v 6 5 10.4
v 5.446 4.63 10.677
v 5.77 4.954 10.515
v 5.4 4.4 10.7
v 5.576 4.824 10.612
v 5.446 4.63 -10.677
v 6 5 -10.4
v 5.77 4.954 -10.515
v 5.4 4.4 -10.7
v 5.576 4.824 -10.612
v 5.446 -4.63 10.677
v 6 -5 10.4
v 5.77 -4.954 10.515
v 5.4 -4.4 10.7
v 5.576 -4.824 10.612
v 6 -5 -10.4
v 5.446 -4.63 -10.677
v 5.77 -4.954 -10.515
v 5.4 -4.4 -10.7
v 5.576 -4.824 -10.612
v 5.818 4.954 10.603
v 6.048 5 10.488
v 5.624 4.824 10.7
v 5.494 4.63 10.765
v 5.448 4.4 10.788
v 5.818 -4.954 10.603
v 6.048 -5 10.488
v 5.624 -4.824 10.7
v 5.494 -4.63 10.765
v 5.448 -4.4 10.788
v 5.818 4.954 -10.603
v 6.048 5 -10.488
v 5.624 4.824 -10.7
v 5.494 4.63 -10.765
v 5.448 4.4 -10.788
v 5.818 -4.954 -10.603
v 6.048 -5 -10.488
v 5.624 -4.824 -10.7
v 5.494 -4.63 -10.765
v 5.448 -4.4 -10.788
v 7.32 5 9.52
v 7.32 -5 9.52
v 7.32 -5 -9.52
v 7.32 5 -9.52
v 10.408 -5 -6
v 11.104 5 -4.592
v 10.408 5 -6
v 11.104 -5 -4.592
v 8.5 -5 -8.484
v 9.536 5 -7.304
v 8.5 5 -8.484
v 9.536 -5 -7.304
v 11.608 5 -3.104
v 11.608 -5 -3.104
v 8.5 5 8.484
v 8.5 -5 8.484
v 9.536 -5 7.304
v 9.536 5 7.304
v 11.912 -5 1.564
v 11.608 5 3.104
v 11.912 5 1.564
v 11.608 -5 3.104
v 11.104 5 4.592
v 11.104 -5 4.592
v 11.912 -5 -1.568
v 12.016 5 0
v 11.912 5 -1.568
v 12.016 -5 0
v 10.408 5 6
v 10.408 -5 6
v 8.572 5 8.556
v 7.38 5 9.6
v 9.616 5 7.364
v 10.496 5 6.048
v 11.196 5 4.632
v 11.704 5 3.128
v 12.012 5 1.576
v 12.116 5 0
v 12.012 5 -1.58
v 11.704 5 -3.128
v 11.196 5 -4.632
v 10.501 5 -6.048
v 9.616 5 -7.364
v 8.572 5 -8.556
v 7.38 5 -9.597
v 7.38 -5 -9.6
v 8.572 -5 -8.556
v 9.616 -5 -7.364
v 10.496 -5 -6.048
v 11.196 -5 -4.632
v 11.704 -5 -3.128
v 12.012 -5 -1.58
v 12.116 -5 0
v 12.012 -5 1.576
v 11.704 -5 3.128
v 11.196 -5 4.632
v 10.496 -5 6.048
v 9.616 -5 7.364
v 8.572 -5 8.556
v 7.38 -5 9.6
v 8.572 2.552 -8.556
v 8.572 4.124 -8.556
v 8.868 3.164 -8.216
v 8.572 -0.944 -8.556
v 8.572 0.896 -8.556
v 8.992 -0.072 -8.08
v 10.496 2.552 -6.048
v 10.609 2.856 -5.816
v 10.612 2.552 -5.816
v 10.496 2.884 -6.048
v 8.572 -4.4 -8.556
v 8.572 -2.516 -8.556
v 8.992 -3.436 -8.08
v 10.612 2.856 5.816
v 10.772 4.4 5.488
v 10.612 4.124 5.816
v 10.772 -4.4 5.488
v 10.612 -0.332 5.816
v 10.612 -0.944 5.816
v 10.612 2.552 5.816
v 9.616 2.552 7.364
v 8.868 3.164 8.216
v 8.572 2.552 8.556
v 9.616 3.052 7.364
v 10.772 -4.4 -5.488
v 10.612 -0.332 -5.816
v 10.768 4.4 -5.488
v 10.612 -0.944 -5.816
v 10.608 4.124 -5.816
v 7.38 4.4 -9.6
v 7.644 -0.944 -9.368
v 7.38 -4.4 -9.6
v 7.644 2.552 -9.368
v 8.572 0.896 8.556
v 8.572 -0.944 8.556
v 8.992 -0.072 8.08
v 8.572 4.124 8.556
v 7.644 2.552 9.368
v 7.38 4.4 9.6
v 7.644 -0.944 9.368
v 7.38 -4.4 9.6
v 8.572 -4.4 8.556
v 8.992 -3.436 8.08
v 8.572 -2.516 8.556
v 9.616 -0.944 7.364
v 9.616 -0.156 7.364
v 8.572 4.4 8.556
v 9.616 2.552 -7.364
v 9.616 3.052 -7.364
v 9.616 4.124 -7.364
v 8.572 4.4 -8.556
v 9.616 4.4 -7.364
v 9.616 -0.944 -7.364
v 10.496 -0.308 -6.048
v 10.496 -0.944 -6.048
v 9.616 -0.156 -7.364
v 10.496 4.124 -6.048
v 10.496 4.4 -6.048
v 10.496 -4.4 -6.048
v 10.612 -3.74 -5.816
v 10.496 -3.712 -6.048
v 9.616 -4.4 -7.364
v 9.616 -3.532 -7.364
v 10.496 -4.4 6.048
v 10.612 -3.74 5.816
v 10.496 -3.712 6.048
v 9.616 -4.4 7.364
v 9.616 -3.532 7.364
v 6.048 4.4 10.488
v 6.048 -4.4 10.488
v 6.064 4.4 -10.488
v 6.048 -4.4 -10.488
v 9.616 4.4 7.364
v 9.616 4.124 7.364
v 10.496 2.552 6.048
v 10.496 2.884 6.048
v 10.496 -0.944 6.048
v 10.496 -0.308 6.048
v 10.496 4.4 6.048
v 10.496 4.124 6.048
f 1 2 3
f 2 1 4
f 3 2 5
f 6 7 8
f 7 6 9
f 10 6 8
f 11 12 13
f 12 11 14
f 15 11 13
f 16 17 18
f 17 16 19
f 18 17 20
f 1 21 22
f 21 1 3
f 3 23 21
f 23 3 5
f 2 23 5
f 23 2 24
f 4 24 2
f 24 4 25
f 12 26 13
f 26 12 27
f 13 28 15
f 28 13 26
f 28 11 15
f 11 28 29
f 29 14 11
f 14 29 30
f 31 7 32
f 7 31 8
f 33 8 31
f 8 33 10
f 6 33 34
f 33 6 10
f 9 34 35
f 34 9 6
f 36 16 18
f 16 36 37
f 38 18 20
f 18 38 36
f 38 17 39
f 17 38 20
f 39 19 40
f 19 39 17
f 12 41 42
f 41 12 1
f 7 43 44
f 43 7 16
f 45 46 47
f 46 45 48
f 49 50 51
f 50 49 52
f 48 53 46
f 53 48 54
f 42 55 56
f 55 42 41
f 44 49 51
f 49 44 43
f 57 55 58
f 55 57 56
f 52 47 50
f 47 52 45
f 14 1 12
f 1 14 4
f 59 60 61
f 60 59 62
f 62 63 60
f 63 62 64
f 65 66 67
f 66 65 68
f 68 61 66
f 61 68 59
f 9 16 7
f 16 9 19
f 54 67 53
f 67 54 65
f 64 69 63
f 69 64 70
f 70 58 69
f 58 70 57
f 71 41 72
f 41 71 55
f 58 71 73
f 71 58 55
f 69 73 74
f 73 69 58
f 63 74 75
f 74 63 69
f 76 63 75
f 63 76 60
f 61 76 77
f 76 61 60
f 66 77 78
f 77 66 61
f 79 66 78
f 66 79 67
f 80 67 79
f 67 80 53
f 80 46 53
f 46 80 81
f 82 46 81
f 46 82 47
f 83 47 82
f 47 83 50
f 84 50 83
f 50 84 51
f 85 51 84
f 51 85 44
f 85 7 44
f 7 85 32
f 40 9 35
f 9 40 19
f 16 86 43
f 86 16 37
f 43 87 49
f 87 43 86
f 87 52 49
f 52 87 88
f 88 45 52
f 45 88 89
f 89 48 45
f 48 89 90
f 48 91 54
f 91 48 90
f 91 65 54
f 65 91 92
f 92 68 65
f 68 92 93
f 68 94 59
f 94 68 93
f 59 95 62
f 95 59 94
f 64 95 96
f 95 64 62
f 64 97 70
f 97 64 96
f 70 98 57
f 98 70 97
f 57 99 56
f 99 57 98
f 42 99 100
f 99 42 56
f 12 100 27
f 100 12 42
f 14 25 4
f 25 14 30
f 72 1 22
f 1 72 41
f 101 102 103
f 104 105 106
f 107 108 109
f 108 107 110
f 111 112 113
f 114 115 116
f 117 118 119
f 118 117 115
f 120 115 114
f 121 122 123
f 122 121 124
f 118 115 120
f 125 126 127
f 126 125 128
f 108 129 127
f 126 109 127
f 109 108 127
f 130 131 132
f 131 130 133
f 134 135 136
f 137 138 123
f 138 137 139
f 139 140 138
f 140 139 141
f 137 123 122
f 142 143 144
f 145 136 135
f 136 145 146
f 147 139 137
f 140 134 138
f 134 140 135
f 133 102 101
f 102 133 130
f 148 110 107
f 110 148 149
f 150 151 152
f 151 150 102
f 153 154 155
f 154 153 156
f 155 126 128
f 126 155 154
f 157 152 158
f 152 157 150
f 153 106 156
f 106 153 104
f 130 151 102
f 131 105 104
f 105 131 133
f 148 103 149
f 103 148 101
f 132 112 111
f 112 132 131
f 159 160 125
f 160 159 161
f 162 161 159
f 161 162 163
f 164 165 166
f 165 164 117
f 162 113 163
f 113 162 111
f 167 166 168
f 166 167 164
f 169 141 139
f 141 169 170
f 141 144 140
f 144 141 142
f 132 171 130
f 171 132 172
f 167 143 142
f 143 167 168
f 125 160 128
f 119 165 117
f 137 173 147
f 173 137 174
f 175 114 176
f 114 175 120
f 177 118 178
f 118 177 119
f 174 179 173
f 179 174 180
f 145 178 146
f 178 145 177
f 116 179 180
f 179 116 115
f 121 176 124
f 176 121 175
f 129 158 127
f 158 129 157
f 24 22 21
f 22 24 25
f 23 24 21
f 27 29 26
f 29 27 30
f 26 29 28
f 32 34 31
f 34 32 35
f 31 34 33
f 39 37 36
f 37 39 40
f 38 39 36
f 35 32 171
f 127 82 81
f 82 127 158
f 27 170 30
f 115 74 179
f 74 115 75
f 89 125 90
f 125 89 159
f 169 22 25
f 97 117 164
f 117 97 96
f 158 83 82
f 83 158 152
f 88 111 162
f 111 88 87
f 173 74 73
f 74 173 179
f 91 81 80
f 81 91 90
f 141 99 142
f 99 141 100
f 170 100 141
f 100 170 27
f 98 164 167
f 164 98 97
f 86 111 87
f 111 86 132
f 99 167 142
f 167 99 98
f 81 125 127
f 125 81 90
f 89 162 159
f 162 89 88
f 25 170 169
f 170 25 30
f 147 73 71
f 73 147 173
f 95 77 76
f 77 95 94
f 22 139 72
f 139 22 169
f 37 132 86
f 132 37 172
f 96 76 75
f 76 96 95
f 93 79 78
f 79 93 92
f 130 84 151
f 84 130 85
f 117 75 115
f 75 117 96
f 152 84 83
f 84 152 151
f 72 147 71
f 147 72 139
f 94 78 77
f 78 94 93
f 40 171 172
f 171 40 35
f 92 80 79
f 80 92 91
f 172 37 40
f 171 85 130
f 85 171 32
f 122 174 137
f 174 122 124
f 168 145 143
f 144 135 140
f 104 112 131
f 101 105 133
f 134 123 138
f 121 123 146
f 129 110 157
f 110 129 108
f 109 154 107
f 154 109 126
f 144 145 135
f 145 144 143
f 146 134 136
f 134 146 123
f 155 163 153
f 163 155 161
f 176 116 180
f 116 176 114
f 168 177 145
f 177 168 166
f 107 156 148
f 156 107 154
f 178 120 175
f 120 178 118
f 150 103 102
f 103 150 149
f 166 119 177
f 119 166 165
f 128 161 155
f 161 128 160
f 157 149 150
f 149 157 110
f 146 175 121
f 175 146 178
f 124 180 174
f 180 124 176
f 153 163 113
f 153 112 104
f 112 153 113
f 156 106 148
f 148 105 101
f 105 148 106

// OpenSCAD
// file: ../p/1-4cyli.scad
use <../lib.scad>
function ldraw_lib__1_4cyli() = [
// 0 Cylinder 0.25
// 0 Name: 1-4cyli.dat
// 0 Author: James Jessiman
// 0 !LDRAW_ORG Primitive UPDATE 2012-01
// 0 !LICENSE Licensed under CC BY 4.0 : see CAreadme.txt
// 
// 0 BFC CERTIFY CCW
  [0,"BFC","CERTIFY"],
  [0,"BFC","CCW"],
// 
// 0 !HISTORY 2002-03-23 [sbliss] Added BFC statement.
// 0 !HISTORY 2002-04-25 [PTadmin] Official Update 2002-02
// 0 !HISTORY 2007-06-22 [PTadmin] Header formatted for Contributor Agreement
// 0 !HISTORY 2008-07-01 [PTadmin] Official Update 2008-01
// 0 !HISTORY 2012-02-16 [Philo] Changed to CCW
// 0 !HISTORY 2012-03-30 [PTadmin] Official Update 2012-01
// 
// 
// 4 16 1 1 0 0.9239 1 0.3827 0.9239 0 0.3827 1 0 0
  [4,16,1,1,0,0.9239,1,0.3827,0.9239,0,0.3827,1,0,0],
// 5 24 1 0 0 1 1 0 0.9239 0 0.3827 1 0 -1
  [5,24,1,0,0,1,1,0,0.9239,0,0.3827,1,0,-1],
// 4 16 0.9239 1 0.3827 0.7071 1 0.7071 0.7071 0 0.7071 0.9239 0 0.3827
  [4,16,0.9239,1,0.3827,0.7071,1,0.7071,0.7071,0,0.7071,0.9239,0,0.3827],
// 5 24 0.9239 0 0.3827 0.9239 1 0.3827 0.7071 0 0.7071 1 0 0
  [5,24,0.9239,0,0.3827,0.9239,1,0.3827,0.7071,0,0.7071,1,0,0],
// 4 16 0.7071 1 0.7071 0.3827 1 0.9239 0.3827 0 0.9239 0.7071 0 0.7071
  [4,16,0.7071,1,0.7071,0.3827,1,0.9239,0.3827,0,0.9239,0.7071,0,0.7071],
// 5 24 0.7071 0 0.7071 0.7071 1 0.7071 0.3827 0 0.9239 0.9239 0 0.3827
  [5,24,0.7071,0,0.7071,0.7071,1,0.7071,0.3827,0,0.9239,0.9239,0,0.3827],
// 4 16 0.3827 1 0.9239 0 1 1 0 0 1 0.3827 0 0.9239
  [4,16,0.3827,1,0.9239,0,1,1,0,0,1,0.3827,0,0.9239],
// 5 24 0.3827 0 0.9239 0.3827 1 0.9239 0 0 1 0.7071 0 0.7071
  [5,24,0.3827,0,0.9239,0.3827,1,0.9239,0,0,1,0.7071,0,0.7071],
// 5 24 0 0 1 0 1 1 0.3827 0 0.9239 -1 0 1
  [5,24,0,0,1,0,1,1,0.3827,0,0.9239,-1,0,1],
];
module ldraw_lib__1_4cyli(step=0, col=false, unit=2/5, alt=false, line=0.2, solid=!$preview)
    makepoly(ldraw_lib__1_4cyli(), step=step, col=col, unit=unit, alt=alt, line=line, solid=solid);
ldraw_lib__1_4cyli(line=0.2);
// file: ../p/1-4chrd.scad
use <../lib.scad>
function ldraw_lib__1_4chrd() = [
// 0 Chord 0.25
// 0 Name: 1-4chrd.dat
// 0 Author: Max Martin Richter [MMR1988]
// 0 !LDRAW_ORG Primitive UPDATE 2023-05
// 0 !LICENSE Licensed under CC BY 4.0 : see CAreadme.txt
// 
// 0 BFC CERTIFY CCW
  [0,"BFC","CERTIFY"],
  [0,"BFC","CCW"],
// 
// 0 !HISTORY 2004-04-22 [PTadmin] Official Update 2004-02
// 0 !HISTORY 2007-10-09 [PTadmin] Header formatted for Contributor Agreement
// 0 !HISTORY 2008-07-01 [PTadmin] Official Update 2008-01
// 0 !HISTORY 2012-08-02 [MMR1988] Re-creation with PrimGen2 and Rectifier
// 0 !HISTORY 2012-08-09 [PTadmin] Official Update 2012-02
// 0 !HISTORY 2023-10-27 [OrionP] Change author to MMR1988 from hafhead
// 0 !HISTORY 2023-10-31 [OrionP] Official Update 2023-05
// 
// 4 16 0.9239 0 0.3827 0.3827 0 0.9239 0 0 1 1 0 0
  [4,16,0.9239,0,0.3827,0.3827,0,0.9239,0,0,1,1,0,0],
// 3 16 0.7071 0 0.7071 0.3827 0 0.9239 0.9239 0 0.3827
  [3,16,0.7071,0,0.7071,0.3827,0,0.9239,0.9239,0,0.3827],
];
module ldraw_lib__1_4chrd(step=0, col=false, unit=2/5, alt=false, line=0.2, solid=!$preview)
    makepoly(ldraw_lib__1_4chrd(), step=step, col=col, unit=unit, alt=alt, line=line, solid=solid);
ldraw_lib__1_4chrd(line=0.2);
// main file
use <../lib.scad>
use <../p/1-4chrd.scad>
use <s/93168b01.scad>
function ldraw_lib__4622098ac01() = [
// 0 Sticker  3.3 x  1.3 with Square Connections with Vents on Blue Background (Formed)
// 0 Name: 4622098ac01.dat
// 0 Author: Alex Herrera [alanbrito98]
// 0 !LDRAW_ORG Part UPDATE 2026-05
// 0 !LICENSE Licensed under CC BY 4.0 : see CAreadme.txt
// 
// 0 !HELP Origin adapted to Part 93168.dat
// 0 !HELP 1 16 0 0 0 1 0 0 0 1 0 0 0 1 93168.dat
// 0 !HELP 1 1 0 0 -40 1 0 0 0 1 0 0 0 1 4622098ac01.dat
// 0 !HELP 1 1 0 0 -40 -1 0 0 0 -1 0 0 0 1 4622098ac01.dat
// 
// 0 BFC CERTIFY CCW
  [0,"BFC","CERTIFY"],
  [0,"BFC","CCW"],
// 
// 0 !KEYWORDS Bricklink 7962stk01, Brickowl 968771, Episode I, pod racer
// 0 !KEYWORDS Rebrickable 95687, Set 7962, Star Wars, The Phantom Menace
// 
// 0 !HISTORY 2025-05-10 [MagFors] used cyli, corrected condlines
// 0 !HISTORY 2025-11-08 [MagFors] adapted corners to standard
// 0 !HISTORY 2026-05-31 [OrionP] Official Update 2026-05
// 
// 1 16 0 0 0 1 0 0 0 1 0 0 0 1 s\93168b01.dat
  [1,16,0,0,0,1,0,0,0,1,0,0,0,1, ldraw_lib__s__93168b01()],
// 0 // Pattern
// 3 0 21.43 21.39 6.38 21.43 21.39 10.31 22.17 20.54 7.91
  [3,0,21.43,21.39,6.38,21.43,21.39,10.31,22.17,20.54,7.91],
// 3 0 21.43 21.39 -2.36 21.43 21.39 2.24 22.48 20.2 -.18
  [3,0,21.43,21.39,-2.36,21.43,21.39,2.24,22.48,20.2,-.18],
// 4 0 26.24 15.12 7.21 26.522 14.54 7.14 26.53 14.54 6.38 26.24 15.12 6.38
  [4,0,26.24,15.12,7.21,26.522,14.54,7.14,26.53,14.54,6.38,26.24,15.12,6.38],
// 3 0 21.43 21.39 -11 21.43 21.39 -6.29 22.48 20.2 -8.59
  [3,0,21.43,21.39,-11,21.43,21.39,-6.29,22.48,20.2,-8.59],
// 3 0 26.53 -14.54 7.14 26.93 -13.72 11 26.53 -14.54 10.31
  [3,0,26.53,-14.54,7.14,26.93,-13.72,11,26.53,-14.54,10.31],
// 4 0 26.93 -13.72 -11 26.93 -13.72 11 26.53 -14.54 -.83 26.53 -14.54 -2.36
  [4,0,26.93,-13.72,-11,26.93,-13.72,11,26.53,-14.54,-.83,26.53,-14.54,-2.36],
// 3 0 26.53 -14.54 6.38 26.93 -13.72 11 26.53 -14.54 7.14
  [3,0,26.53,-14.54,6.38,26.93,-13.72,11,26.53,-14.54,7.14],
// 4 0 22.17 -20.54 7.91 21.43 -21.39 6.38 24.04 -18.41 6.38 24.04 -18.41 7.63
  [4,0,22.17,-20.54,7.91,21.43,-21.39,6.38,24.04,-18.41,6.38,24.04,-18.41,7.63],
// 3 0 26.53 -14.54 -.83 26.93 -13.72 11 26.53 -14.54 6.38
  [3,0,26.53,-14.54,-.83,26.93,-13.72,11,26.53,-14.54,6.38],
// 4 0 26.93 13.72 -11 26.53 14.54 -2.36 26.53 14.54 -.83 26.92 13.72 11
  [4,0,26.93,13.72,-11,26.53,14.54,-2.36,26.53,14.54,-.83,26.92,13.72,11],
// 3 0 26.522 14.54 7.14 26.52 14.54 10.31 26.92 13.72 11
  [3,0,26.522,14.54,7.14,26.52,14.54,10.31,26.92,13.72,11],
// 3 0 26.53 14.54 -.83 26.53 14.54 6.38 26.92 13.72 11
  [3,0,26.53,14.54,-.83,26.53,14.54,6.38,26.92,13.72,11],
// 3 0 26.53 14.54 6.38 26.522 14.54 7.14 26.92 13.72 11
  [3,0,26.53,14.54,6.38,26.522,14.54,7.14,26.92,13.72,11],
// 4 0 19.11 23.42 6.38 19.11 23.42 -2.36 18.45 24 -11 18.45 24 11
  [4,0,19.11,23.42,6.38,19.11,23.42,-2.36,18.45,24,-11,18.45,24,11],
// 3 0 21.43 -21.39 2.24 21.43 -21.39 -2.36 22.48 -20.2 -.18
  [3,0,21.43,-21.39,2.24,21.43,-21.39,-2.36,22.48,-20.2,-.18],
// 4 0 18.45 -24 11 19.11 -23.42 6.38 21.43 -21.39 6.38 21.43 -21.39 10.31
  [4,0,18.45,-24,11,19.11,-23.42,6.38,21.43,-21.39,6.38,21.43,-21.39,10.31],
// 4 0 19.11 -23.42 6.38 18.45 -24 11 18.45 -24 -11 19.11 -23.42 -2.36
  [4,0,19.11,-23.42,6.38,18.45,-24,11,18.45,-24,-11,19.11,-23.42,-2.36],
// 3 0 21.43 -21.39 10.31 21.43 -21.39 6.38 22.17 -20.54 7.91
  [3,0,21.43,-21.39,10.31,21.43,-21.39,6.38,22.17,-20.54,7.91],
// 3 0 21.43 -21.39 -11 22.48 -20.2 -8.59 21.43 -21.39 -6.29
  [3,0,21.43,-21.39,-11,22.48,-20.2,-8.59,21.43,-21.39,-6.29],
// 4 0 22.48 -20.2 -.18 21.43 -21.39 -2.36 24.04 -18.41 -2.36 24.04 -18.41 -.39
  [4,0,22.48,-20.2,-.18,21.43,-21.39,-2.36,24.04,-18.41,-2.36,24.04,-18.41,-.39],
// 3 0 21.43 -21.39 11 18.45 -24 11 21.43 -21.39 10.31
  [3,0,21.43,-21.39,11,18.45,-24,11,21.43,-21.39,10.31],
// 4 0 21.43 -21.39 -2.36 21.43 -21.39 2.24 19.11 -23.42 6.38 19.11 -23.42 -2.36
  [4,0,21.43,-21.39,-2.36,21.43,-21.39,2.24,19.11,-23.42,6.38,19.11,-23.42,-2.36],
// 4 0 21.43 21.39 6.38 19.11 23.42 6.38 18.45 24 11 21.43 21.39 10.31
  [4,0,21.43,21.39,6.38,19.11,23.42,6.38,18.45,24,11,21.43,21.39,10.31],
// 4 0 26.24 15.12 7.21 26.24 15.12 6.38 24.04 18.41 6.38 24.04 18.41 7.63
  [4,0,26.24,15.12,7.21,26.24,15.12,6.38,24.04,18.41,6.38,24.04,18.41,7.63],
// 4 0 24.04 18.41 11 24.04 18.41 10.31 21.43 21.39 10.31 21.43 21.39 11
  [4,0,24.04,18.41,11,24.04,18.41,10.31,21.43,21.39,10.31,21.43,21.39,11],
// 4 0 26.24 15.12 -.77 26.24 15.12 -2.36 24.04 18.41 -2.36 24.04 18.41 -.39
  [4,0,26.24,15.12,-.77,26.24,15.12,-2.36,24.04,18.41,-2.36,24.04,18.41,-.39],
// 4 0 26.24 15.12 -.77 26.53 14.54 -.83 26.53 14.54 -2.36 26.24 15.12 -2.36
  [4,0,26.24,15.12,-.77,26.53,14.54,-.83,26.53,14.54,-2.36,26.24,15.12,-2.36],
// 4 0 26.24 15.12 11 26.24 15.12 10.31 24.04 18.41 10.31 24.04 18.41 11
  [4,0,26.24,15.12,11,26.24,15.12,10.31,24.04,18.41,10.31,24.04,18.41,11],
// 4 0 21.43 21.39 -2.36 22.48 20.2 -.18 24.04 18.41 -.39 24.04 18.41 -2.36
  [4,0,21.43,21.39,-2.36,22.48,20.2,-.18,24.04,18.41,-.39,24.04,18.41,-2.36],
// 3 0 18.45 24 11 21.43 21.39 11 21.43 21.39 10.31
  [3,0,18.45,24,11,21.43,21.39,11,21.43,21.39,10.31],
// 4 0 19.11 23.42 6.38 21.43 21.39 2.24 21.43 21.39 -2.36 19.11 23.42 -2.36
  [4,0,19.11,23.42,6.38,21.43,21.39,2.24,21.43,21.39,-2.36,19.11,23.42,-2.36],
// 4 0 21.43 21.39 6.38 22.17 20.54 7.91 24.04 18.41 7.63 24.04 18.41 6.38
  [4,0,21.43,21.39,6.38,22.17,20.54,7.91,24.04,18.41,7.63,24.04,18.41,6.38],
// 4 0 18.45 24 -11 19.11 23.42 -2.36 21.43 21.39 -6.29 21.43 21.39 -11
  [4,0,18.45,24,-11,19.11,23.42,-2.36,21.43,21.39,-6.29,21.43,21.39,-11],
// 4 0 26.24 15.12 -9.28 26.53 14.54 -9.35 26.93 13.72 -11 26.24 15.12 -11
  [4,0,26.24,15.12,-9.28,26.53,14.54,-9.35,26.93,13.72,-11,26.24,15.12,-11],
// 4 0 24.04 18.41 -11 24.04 18.41 -8.83 26.24 15.12 -9.28 26.24 15.12 -11
  [4,0,24.04,18.41,-11,24.04,18.41,-8.83,26.24,15.12,-9.28,26.24,15.12,-11],
// 4 0 26.24 -15.12 -11 26.93 -13.72 -11 26.53 -14.54 -9.35 26.24 -15.12 -9.28
  [4,0,26.24,-15.12,-11,26.93,-13.72,-11,26.53,-14.54,-9.35,26.24,-15.12,-9.28],
// 4 0 21.43 21.39 -11 22.48 20.2 -8.59 24.04 18.41 -8.83 24.04 18.41 -11
  [4,0,21.43,21.39,-11,22.48,20.2,-8.59,24.04,18.41,-8.83,24.04,18.41,-11],
// 4 0 26.24 -15.12 -11 26.24 -15.12 -9.28 24.04 -18.41 -8.83 24.04 -18.41 -11
  [4,0,26.24,-15.12,-11,26.24,-15.12,-9.28,24.04,-18.41,-8.83,24.04,-18.41,-11],
// 4 0 18.45 -24 -11 18.45 -24 11 15.12 -26.22 11 15.12 -26.22 -11
  [4,0,18.45,-24,-11,18.45,-24,11,15.12,-26.22,11,15.12,-26.22,-11],
// 4 0 21.43 -21.39 -11 21.43 -21.39 -6.29 19.11 -23.42 -2.36 18.45 -24 -11
  [4,0,21.43,-21.39,-11,21.43,-21.39,-6.29,19.11,-23.42,-2.36,18.45,-24,-11],
// 4 0 15.16 26.22 11 18.45 24 11 18.45 24 -11 15.12 26.22 -11
  [4,0,15.16,26.22,11,18.45,24,11,18.45,24,-11,15.12,26.22,-11],
// 4 0 24.04 -18.41 -8.83 22.48 -20.2 -8.59 21.43 -21.39 -11 24.04 -18.41 -11
  [4,0,24.04,-18.41,-8.83,22.48,-20.2,-8.59,21.43,-21.39,-11,24.04,-18.41,-11],
// 3 0 26.93 13.72 -11 26.53 14.54 -9.35 26.53 14.54 -2.36
  [3,0,26.93,13.72,-11,26.53,14.54,-9.35,26.53,14.54,-2.36],
// 3 0 26.53 -14.54 -2.36 26.53 -14.54 -9.35 26.93 -13.72 -11
  [3,0,26.53,-14.54,-2.36,26.53,-14.54,-9.35,26.93,-13.72,-11],
// 4 0 21.43 -21.39 11 21.43 -21.39 10.31 24.04 -18.41 10.31 24.04 -18.41 11
  [4,0,21.43,-21.39,11,21.43,-21.39,10.31,24.04,-18.41,10.31,24.04,-18.41,11],
// 4 0 26.24 -15.12 6.38 26.53 -14.54 6.38 26.53 -14.54 7.14 26.24 -15.12 7.21
  [4,0,26.24,-15.12,6.38,26.53,-14.54,6.38,26.53,-14.54,7.14,26.24,-15.12,7.21],
// 4 0 26.24 -15.12 -2.36 26.53 -14.54 -2.36 26.53 -14.54 -.83 26.24 -15.12 -.77
  [4,0,26.24,-15.12,-2.36,26.53,-14.54,-2.36,26.53,-14.54,-.83,26.24,-15.12,-.77],
// 4 0 24.04 -18.41 11 24.04 -18.41 10.31 26.24 -15.12 10.31 26.24 -15.12 11
  [4,0,24.04,-18.41,11,24.04,-18.41,10.31,26.24,-15.12,10.31,26.24,-15.12,11],
// 4 0 24.04 -18.41 -.39 24.04 -18.41 -2.36 26.24 -15.12 -2.36 26.24 -15.12 -.77
  [4,0,24.04,-18.41,-.39,24.04,-18.41,-2.36,26.24,-15.12,-2.36,26.24,-15.12,-.77],
// 4 0 26.24 -15.12 10.31 26.53 -14.54 10.31 26.93 -13.72 11 26.24 -15.12 11
  [4,0,26.24,-15.12,10.31,26.53,-14.54,10.31,26.93,-13.72,11,26.24,-15.12,11],
// 4 0 24.04 -18.41 7.63 24.04 -18.41 6.38 26.24 -15.12 6.38 26.24 -15.12 7.21
  [4,0,24.04,-18.41,7.63,24.04,-18.41,6.38,26.24,-15.12,6.38,26.24,-15.12,7.21],
// 4 0 26.24 15.12 11 26.92 13.72 11 26.52 14.54 10.31 26.24 15.12 10.31
  [4,0,26.24,15.12,11,26.92,13.72,11,26.52,14.54,10.31,26.24,15.12,10.31],
// 1 1 15.12 -26.22 11 0 0 -1.5 0 1 -.75 1.5 0 0 1-4chrd.dat
  [1,1,15.12,-26.22,11,0,0,-1.5,0,1,-.75,1.5,0,0, ldraw_lib__1_4chrd()],
// 1 1 15.12 -26.22 -11 0 0 -1.5 0 1 -.75 -1.5 0 0 1-4chrd.dat
  [1,1,15.12,-26.22,-11,0,0,-1.5,0,1,-.75,-1.5,0,0, ldraw_lib__1_4chrd()],
// 1 1 15.12 26.22 11 0 0 -1.5 0 -1 .75 1.5 0 0 1-4chrd.dat
  [1,1,15.12,26.22,11,0,0,-1.5,0,-1,.75,1.5,0,0, ldraw_lib__1_4chrd()],
// 1 1 15.12 26.22 -11 0 0 -1.5 0 -1 .75 -1.5 0 0 1-4chrd.dat
  [1,1,15.12,26.22,-11,0,0,-1.5,0,-1,.75,-1.5,0,0, ldraw_lib__1_4chrd()],
// 3 1 13.62 26.97 11 15.12 26.22 12.5 15.16 26.22 11
  [3,1,13.62,26.97,11,15.12,26.22,12.5,15.16,26.22,11],
// 4 1 27.99 11.58 12.5 26.92 13.72 11 26.24 15.12 11 26.253 15.12 12.5
  [4,1,27.99,11.58,12.5,26.92,13.72,11,26.24,15.12,11,26.253,15.12,12.5],
// 3 1 15.12 -26.22 -12.5 15.12 -26.22 -11 13.62 -26.97 -11
  [3,1,15.12,-26.22,-12.5,15.12,-26.22,-11,13.62,-26.97,-11],
// 4 1 27.99 -11.58 12.5 26.241 -15.12 12.5 26.24 -15.12 11 26.93 -13.72 11
  [4,1,27.99,-11.58,12.5,26.241,-15.12,12.5,26.24,-15.12,11,26.93,-13.72,11],
// 4 1 26.93 13.72 -11 27.99 11.58 -12.5 26.241 15.12 -12.5 26.24 15.12 -11
  [4,1,26.93,13.72,-11,27.99,11.58,-12.5,26.241,15.12,-12.5,26.24,15.12,-11],
// 3 1 15.12 -26.22 11 15.12 -26.22 12.5 13.62 -26.97 11
  [3,1,15.12,-26.22,11,15.12,-26.22,12.5,13.62,-26.97,11],
// 4 1 26.24 -15.12 -11 26.241 -15.12 -12.5 27.99 -11.58 -12.5 26.93 -13.72 -11
  [4,1,26.24,-15.12,-11,26.241,-15.12,-12.5,27.99,-11.58,-12.5,26.93,-13.72,-11],
// 4 1 26.253 15.12 12.5 26.24 15.12 11 24.04 18.41 11 24.04 18.41 12.5
  [4,1,26.253,15.12,12.5,26.24,15.12,11,24.04,18.41,11,24.04,18.41,12.5],
// 4 1 21.43 21.39 -12.5 21.43 21.39 -11 24.04 18.41 -11 24.04 18.41 -12.5
  [4,1,21.43,21.39,-12.5,21.43,21.39,-11,24.04,18.41,-11,24.04,18.41,-12.5],
// 4 1 26.241 -15.12 12.5 24.04 -18.41 12.5 24.04 -18.41 11 26.24 -15.12 11
  [4,1,26.241,-15.12,12.5,24.04,-18.41,12.5,24.04,-18.41,11,26.24,-15.12,11],
// 4 1 29.26 7.82 12.5 29.26 7.82 -12.5 27.99 11.58 -12.5 27.99 11.58 12.5
  [4,1,29.26,7.82,12.5,29.26,7.82,-12.5,27.99,11.58,-12.5,27.99,11.58,12.5],
// 4 1 21.43 -21.39 -12.5 21.43 -21.39 -11 18.45 -24 -11 18.45 -24 -12.5
  [4,1,21.43,-21.39,-12.5,21.43,-21.39,-11,18.45,-24,-11,18.45,-24,-12.5],
// 4 1 18.45 -24 -12.5 18.45 -24 -11 15.12 -26.22 -11 15.12 -26.22 -12.5
  [4,1,18.45,-24,-12.5,18.45,-24,-11,15.12,-26.22,-11,15.12,-26.22,-12.5],
// 4 1 26.241 -15.12 -12.5 26.24 -15.12 -11 24.04 -18.41 -11 24.04 -18.41 -12.5
  [4,1,26.241,-15.12,-12.5,26.24,-15.12,-11,24.04,-18.41,-11,24.04,-18.41,-12.5],
// 4 1 18.45 24 -12.5 18.45 24 -11 21.43 21.39 -11 21.43 21.39 -12.5
  [4,1,18.45,24,-12.5,18.45,24,-11,21.43,21.39,-11,21.43,21.39,-12.5],
// 4 1 24.04 -18.41 -12.5 24.04 -18.41 -11 21.43 -21.39 -11 21.43 -21.39 -12.5
  [4,1,24.04,-18.41,-12.5,24.04,-18.41,-11,21.43,-21.39,-11,21.43,-21.39,-12.5],
// 4 1 26.93 13.72 -11 26.92 13.72 11 27.99 11.58 12.5 27.99 11.58 -12.5
  [4,1,26.93,13.72,-11,26.92,13.72,11,27.99,11.58,12.5,27.99,11.58,-12.5],
// 4 1 24.04 18.41 -12.5 24.04 18.41 -11 26.24 15.12 -11 26.241 15.12 -12.5
  [4,1,24.04,18.41,-12.5,24.04,18.41,-11,26.24,15.12,-11,26.241,15.12,-12.5],
// 4 1 15.12 -26.22 11 13.62 -26.97 11 13.62 -26.97 -11 15.12 -26.22 -11
  [4,1,15.12,-26.22,11,13.62,-26.97,11,13.62,-26.97,-11,15.12,-26.22,-11],
// 4 1 24.04 -18.41 12.5 21.43 -21.39 12.5 21.43 -21.39 11 24.04 -18.41 11
  [4,1,24.04,-18.41,12.5,21.43,-21.39,12.5,21.43,-21.39,11,24.04,-18.41,11],
// 4 1 29.26 -7.82 12.5 29.26 -7.82 -12.5 30.03 -3.94 -12.5 30.03 -3.94 12.5
  [4,1,29.26,-7.82,12.5,29.26,-7.82,-12.5,30.03,-3.94,-12.5,30.03,-3.94,12.5],
// 4 1 18.45 -24 12.5 15.12 -26.22 12.5 15.12 -26.22 11 18.45 -24 11
  [4,1,18.45,-24,12.5,15.12,-26.22,12.5,15.12,-26.22,11,18.45,-24,11],
// 4 1 15.12 26.22 -12.5 15.12 26.22 -11 18.45 24 -11 18.45 24 -12.5
  [4,1,15.12,26.22,-12.5,15.12,26.22,-11,18.45,24,-11,18.45,24,-12.5],
// 4 1 27.99 -11.58 12.5 27.99 -11.58 -12.5 29.26 -7.82 -12.5 29.26 -7.82 12.5
  [4,1,27.99,-11.58,12.5,27.99,-11.58,-12.5,29.26,-7.82,-12.5,29.26,-7.82,12.5],
// 4 1 30.29 0 12.5 30.29 0 -12.5 30.03 3.95 -12.5 30.03 3.95 12.5
  [4,1,30.29,0,12.5,30.29,0,-12.5,30.03,3.95,-12.5,30.03,3.95,12.5],
// 4 1 21.43 21.39 12.5 21.43 21.39 11 18.45 24 11 18.45 23.992 12.5
  [4,1,21.43,21.39,12.5,21.43,21.39,11,18.45,24,11,18.45,23.992,12.5],
// 4 1 26.93 -13.72 11 26.93 -13.72 -11 27.99 -11.58 -12.5 27.99 -11.58 12.5
  [4,1,26.93,-13.72,11,26.93,-13.72,-11,27.99,-11.58,-12.5,27.99,-11.58,12.5],
// 4 1 24.04 18.41 12.5 24.04 18.41 11 21.43 21.39 11 21.43 21.39 12.5
  [4,1,24.04,18.41,12.5,24.04,18.41,11,21.43,21.39,11,21.43,21.39,12.5],
// 4 1 21.43 -21.39 12.5 18.45 -24 12.5 18.45 -24 11 21.43 -21.39 11
  [4,1,21.43,-21.39,12.5,18.45,-24,12.5,18.45,-24,11,21.43,-21.39,11],
// 4 1 30.03 -3.94 12.5 30.03 -3.94 -12.5 30.29 0 -12.5 30.29 0 12.5
  [4,1,30.03,-3.94,12.5,30.03,-3.94,-12.5,30.29,0,-12.5,30.29,0,12.5],
// 4 1 13.62 26.97 11 15.16 26.22 11 15.12 26.22 -11 13.62 26.97 -11
  [4,1,13.62,26.97,11,15.16,26.22,11,15.12,26.22,-11,13.62,26.97,-11],
// 4 1 30.03 3.95 12.5 30.03 3.95 -12.5 29.26 7.82 -12.5 29.26 7.82 12.5
  [4,1,30.03,3.95,12.5,30.03,3.95,-12.5,29.26,7.82,-12.5,29.26,7.82,12.5],
// 3 1 15.12 26.22 -11 15.12 26.22 -12.5 13.62 26.97 -11
  [3,1,15.12,26.22,-11,15.12,26.22,-12.5,13.62,26.97,-11],
// 4 1 15.12 26.22 12.5 18.45 23.992 12.5 18.45 24 11 15.16 26.22 11
  [4,1,15.12,26.22,12.5,18.45,23.992,12.5,18.45,24,11,15.16,26.22,11],
// 4 72 22.17 -20.54 7.91 24.04 -18.41 7.63 24.04 -18.41 10.31 21.43 -21.39 10.31
  [4,72,22.17,-20.54,7.91,24.04,-18.41,7.63,24.04,-18.41,10.31,21.43,-21.39,10.31],
// 3 72 24.04 -18.41 -8.83 24.04 -18.41 -2.36 22.48 -20.2 -8.59
  [3,72,24.04,-18.41,-8.83,24.04,-18.41,-2.36,22.48,-20.2,-8.59],
// 3 72 21.43 -21.39 -6.29 21.43 -21.39 -2.36 19.11 -23.42 -2.36
  [3,72,21.43,-21.39,-6.29,21.43,-21.39,-2.36,19.11,-23.42,-2.36],
// 3 72 21.43 21.39 -2.36 21.43 21.39 -6.29 19.11 23.42 -2.36
  [3,72,21.43,21.39,-2.36,21.43,21.39,-6.29,19.11,23.42,-2.36],
// 3 72 21.43 21.39 6.38 21.43 21.39 2.24 19.11 23.42 6.38
  [3,72,21.43,21.39,6.38,21.43,21.39,2.24,19.11,23.42,6.38],
// 3 72 21.43 -21.39 2.24 21.43 -21.39 6.38 19.11 -23.42 6.38
  [3,72,21.43,-21.39,2.24,21.43,-21.39,6.38,19.11,-23.42,6.38],
// 3 72 24.04 -18.41 6.38 21.43 -21.39 6.38 24.04 -18.41 -.39
  [3,72,24.04,-18.41,6.38,21.43,-21.39,6.38,24.04,-18.41,-.39],
// 4 72 26.52 14.54 10.31 26.522 14.54 7.14 26.24 15.12 7.21 26.24 15.12 10.31
  [4,72,26.52,14.54,10.31,26.522,14.54,7.14,26.24,15.12,7.21,26.24,15.12,10.31],
// 4 72 26.24 15.12 6.38 26.53 14.54 6.38 26.53 14.54 -.83 26.24 15.12 -.77
  [4,72,26.24,15.12,6.38,26.53,14.54,6.38,26.53,14.54,-.83,26.24,15.12,-.77],
// 4 72 24.04 -18.41 -2.36 21.43 -21.39 -2.36 21.43 -21.39 -6.29 22.48 -20.2 -8.59
  [4,72,24.04,-18.41,-2.36,21.43,-21.39,-2.36,21.43,-21.39,-6.29,22.48,-20.2,-8.59],
// 4 72 21.43 -21.39 6.38 21.43 -21.39 2.24 22.48 -20.2 -.18 24.04 -18.41 -.39
  [4,72,21.43,-21.39,6.38,21.43,-21.39,2.24,22.48,-20.2,-.18,24.04,-18.41,-.39],
// 4 72 26.24 15.12 -2.36 26.24 15.12 -9.28 24.04 18.41 -8.83 24.04 18.41 -2.36
  [4,72,26.24,15.12,-2.36,26.24,15.12,-9.28,24.04,18.41,-8.83,24.04,18.41,-2.36],
// 4 72 26.53 -14.54 7.14 26.53 -14.54 10.31 26.24 -15.12 10.31 26.24 -15.12 7.21
  [4,72,26.53,-14.54,7.14,26.53,-14.54,10.31,26.24,-15.12,10.31,26.24,-15.12,7.21],
// 4 72 26.24 -15.12 -2.36 24.04 -18.41 -2.36 24.04 -18.41 -8.83 26.24 -15.12 -9.28
  [4,72,26.24,-15.12,-2.36,24.04,-18.41,-2.36,24.04,-18.41,-8.83,26.24,-15.12,-9.28],
// 4 72 26.24 15.12 6.38 26.24 15.12 -.77 24.04 18.41 -.39 24.04 18.41 6.38
  [4,72,26.24,15.12,6.38,26.24,15.12,-.77,24.04,18.41,-.39,24.04,18.41,6.38],
// 4 72 26.24 -15.12 -.77 26.53 -14.54 -.83 26.53 -14.54 6.38 26.24 -15.12 6.38
  [4,72,26.24,-15.12,-.77,26.53,-14.54,-.83,26.53,-14.54,6.38,26.24,-15.12,6.38],
// 4 72 22.17 20.54 7.91 21.43 21.39 10.31 24.04 18.41 10.31 24.04 18.41 7.63
  [4,72,22.17,20.54,7.91,21.43,21.39,10.31,24.04,18.41,10.31,24.04,18.41,7.63],
// 4 72 26.53 -14.54 -2.36 26.24 -15.12 -2.36 26.24 -15.12 -9.28 26.53 -14.54 -9.35
  [4,72,26.53,-14.54,-2.36,26.24,-15.12,-2.36,26.24,-15.12,-9.28,26.53,-14.54,-9.35],
// 4 72 26.53 14.54 -2.36 26.53 14.54 -9.35 26.24 15.12 -9.28 26.24 15.12 -2.36
  [4,72,26.53,14.54,-2.36,26.53,14.54,-9.35,26.24,15.12,-9.28,26.24,15.12,-2.36],
// 4 72 26.24 15.12 10.31 26.24 15.12 7.21 24.04 18.41 7.63 24.04 18.41 10.31
  [4,72,26.24,15.12,10.31,26.24,15.12,7.21,24.04,18.41,7.63,24.04,18.41,10.31],
// 4 72 24.04 -18.41 6.38 24.04 -18.41 -.39 26.24 -15.12 -.77 26.24 -15.12 6.38
  [4,72,24.04,-18.41,6.38,24.04,-18.41,-.39,26.24,-15.12,-.77,26.24,-15.12,6.38],
// 4 72 24.04 -18.41 10.31 24.04 -18.41 7.63 26.24 -15.12 7.21 26.24 -15.12 10.31
  [4,72,24.04,-18.41,10.31,24.04,-18.41,7.63,26.24,-15.12,7.21,26.24,-15.12,10.31],
// 3 72 24.04 18.41 -2.36 24.04 18.41 -8.83 22.48 20.2 -8.59
  [3,72,24.04,18.41,-2.36,24.04,18.41,-8.83,22.48,20.2,-8.59],
// 4 72 21.43 21.39 -2.36 24.04 18.41 -2.36 22.48 20.2 -8.59 21.43 21.39 -6.29
  [4,72,21.43,21.39,-2.36,24.04,18.41,-2.36,22.48,20.2,-8.59,21.43,21.39,-6.29],
// 3 72 24.04 18.41 -.39 22.48 20.2 -.18 24.04 18.41 6.38
  [3,72,24.04,18.41,-.39,22.48,20.2,-.18,24.04,18.41,6.38],
// 4 72 21.43 21.39 6.38 24.04 18.41 6.38 22.48 20.2 -.18 21.43 21.39 2.24
  [4,72,21.43,21.39,6.38,24.04,18.41,6.38,22.48,20.2,-.18,21.43,21.39,2.24],
// 0 // Added lines/Condlines
// 5 24 26.241 -15.12 12.5 26.241 -15.12 -12.5 26.93 -13.72 11 24.04 -18.41 12.5
  [5,24,26.241,-15.12,12.5,26.241,-15.12,-12.5,26.93,-13.72,11,24.04,-18.41,12.5],
// 5 24 26.241 15.12 -12.5 26.253 15.12 12.5 27.99 11.58 -12.5 24.04 18.41 -12.5
  [5,24,26.241,15.12,-12.5,26.253,15.12,12.5,27.99,11.58,-12.5,24.04,18.41,-12.5],
// 5 24 15.12 -26.22 12.5 15.12 -26.22 -12.5 13.62 -26.97 11 18.45 -24 12.5
  [5,24,15.12,-26.22,12.5,15.12,-26.22,-12.5,13.62,-26.97,11,18.45,-24,12.5],
// 5 24 21.43 21.39 -12.5 21.43 21.39 12.5 24.04 18.41 -12.5 18.45 24 -12.5
  [5,24,21.43,21.39,-12.5,21.43,21.39,12.5,24.04,18.41,-12.5,18.45,24,-12.5],
// 5 24 24.04 18.41 -12.5 24.04 18.41 12.5 21.43 21.39 -12.5 26.24 15.12 -12.5
  [5,24,24.04,18.41,-12.5,24.04,18.41,12.5,21.43,21.39,-12.5,26.24,15.12,-12.5],
// 5 24 24.04 -18.41 12.5 24.04 -18.41 -12.5 26.241 -15.12 12.5 21.43 -21.39 12.5
  [5,24,24.04,-18.41,12.5,24.04,-18.41,-12.5,26.241,-15.12,12.5,21.43,-21.39,12.5],
// 5 24 29.26 7.82 -12.5 29.26 7.82 12.5 27.99 11.58 -12.5 30.03 3.95 -12.5
  [5,24,29.26,7.82,-12.5,29.26,7.82,12.5,27.99,11.58,-12.5,30.03,3.95,-12.5],
// 5 24 27.99 11.58 -12.5 27.99 11.58 12.5 29.26 7.82 -12.5 26.93 13.72 -11
  [5,24,27.99,11.58,-12.5,27.99,11.58,12.5,29.26,7.82,-12.5,26.93,13.72,-11],
// 5 24 18.45 24 -12.5 18.45 23.992 12.5 21.43 21.39 -12.5 15.12 26.22 -12.5
  [5,24,18.45,24,-12.5,18.45,23.992,12.5,21.43,21.39,-12.5,15.12,26.22,-12.5],
// 5 24 21.43 -21.39 12.5 21.43 -21.39 -12.5 24.04 -18.41 12.5 18.45 -24 12.5
  [5,24,21.43,-21.39,12.5,21.43,-21.39,-12.5,24.04,-18.41,12.5,18.45,-24,12.5],
// 5 24 29.26 -7.82 -12.5 29.26 -7.82 12.5 30.03 -3.94 -12.5 27.99 -11.58 -12.5
  [5,24,29.26,-7.82,-12.5,29.26,-7.82,12.5,30.03,-3.94,-12.5,27.99,-11.58,-12.5],
// 5 24 30.03 -3.94 -12.5 30.03 -3.94 12.5 29.26 -7.82 -12.5 30.29 0 -12.5
  [5,24,30.03,-3.94,-12.5,30.03,-3.94,12.5,29.26,-7.82,-12.5,30.29,0,-12.5],
// 5 24 18.45 -24 12.5 18.45 -24 -12.5 15.12 -26.22 12.5 21.43 -21.39 12.5
  [5,24,18.45,-24,12.5,18.45,-24,-12.5,15.12,-26.22,12.5,21.43,-21.39,12.5],
// 5 24 15.12 26.22 -12.5 15.12 26.22 12.5 18.45 24 -12.5 13.62 26.97 -11
  [5,24,15.12,26.22,-12.5,15.12,26.22,12.5,18.45,24,-12.5,13.62,26.97,-11],
// 5 24 27.99 -11.58 12.5 27.99 -11.58 -12.5 29.26 -7.82 12.5 26.93 -13.72 11
  [5,24,27.99,-11.58,12.5,27.99,-11.58,-12.5,29.26,-7.82,12.5,26.93,-13.72,11],
// 5 24 30.29 0 -12.5 30.29 0 12.5 30.03 3.95 -12.5 30.03 -3.94 -12.5
  [5,24,30.29,0,-12.5,30.29,0,12.5,30.03,3.95,-12.5,30.03,-3.94,-12.5],
// 5 24 30.03 3.95 -12.5 30.03 3.95 12.5 30.29 0 -12.5 29.26 7.82 -12.5
  [5,24,30.03,3.95,-12.5,30.03,3.95,12.5,30.29,0,-12.5,29.26,7.82,-12.5],
];
module ldraw_lib__4622098ac01(step=0, col=false, unit=2/5, alt=false, line=0.2, solid=!$preview)
    makepoly(ldraw_lib__4622098ac01(), step=step, col=col, unit=unit, alt=alt, line=line, solid=solid);
ldraw_lib__4622098ac01(line=0.2);
